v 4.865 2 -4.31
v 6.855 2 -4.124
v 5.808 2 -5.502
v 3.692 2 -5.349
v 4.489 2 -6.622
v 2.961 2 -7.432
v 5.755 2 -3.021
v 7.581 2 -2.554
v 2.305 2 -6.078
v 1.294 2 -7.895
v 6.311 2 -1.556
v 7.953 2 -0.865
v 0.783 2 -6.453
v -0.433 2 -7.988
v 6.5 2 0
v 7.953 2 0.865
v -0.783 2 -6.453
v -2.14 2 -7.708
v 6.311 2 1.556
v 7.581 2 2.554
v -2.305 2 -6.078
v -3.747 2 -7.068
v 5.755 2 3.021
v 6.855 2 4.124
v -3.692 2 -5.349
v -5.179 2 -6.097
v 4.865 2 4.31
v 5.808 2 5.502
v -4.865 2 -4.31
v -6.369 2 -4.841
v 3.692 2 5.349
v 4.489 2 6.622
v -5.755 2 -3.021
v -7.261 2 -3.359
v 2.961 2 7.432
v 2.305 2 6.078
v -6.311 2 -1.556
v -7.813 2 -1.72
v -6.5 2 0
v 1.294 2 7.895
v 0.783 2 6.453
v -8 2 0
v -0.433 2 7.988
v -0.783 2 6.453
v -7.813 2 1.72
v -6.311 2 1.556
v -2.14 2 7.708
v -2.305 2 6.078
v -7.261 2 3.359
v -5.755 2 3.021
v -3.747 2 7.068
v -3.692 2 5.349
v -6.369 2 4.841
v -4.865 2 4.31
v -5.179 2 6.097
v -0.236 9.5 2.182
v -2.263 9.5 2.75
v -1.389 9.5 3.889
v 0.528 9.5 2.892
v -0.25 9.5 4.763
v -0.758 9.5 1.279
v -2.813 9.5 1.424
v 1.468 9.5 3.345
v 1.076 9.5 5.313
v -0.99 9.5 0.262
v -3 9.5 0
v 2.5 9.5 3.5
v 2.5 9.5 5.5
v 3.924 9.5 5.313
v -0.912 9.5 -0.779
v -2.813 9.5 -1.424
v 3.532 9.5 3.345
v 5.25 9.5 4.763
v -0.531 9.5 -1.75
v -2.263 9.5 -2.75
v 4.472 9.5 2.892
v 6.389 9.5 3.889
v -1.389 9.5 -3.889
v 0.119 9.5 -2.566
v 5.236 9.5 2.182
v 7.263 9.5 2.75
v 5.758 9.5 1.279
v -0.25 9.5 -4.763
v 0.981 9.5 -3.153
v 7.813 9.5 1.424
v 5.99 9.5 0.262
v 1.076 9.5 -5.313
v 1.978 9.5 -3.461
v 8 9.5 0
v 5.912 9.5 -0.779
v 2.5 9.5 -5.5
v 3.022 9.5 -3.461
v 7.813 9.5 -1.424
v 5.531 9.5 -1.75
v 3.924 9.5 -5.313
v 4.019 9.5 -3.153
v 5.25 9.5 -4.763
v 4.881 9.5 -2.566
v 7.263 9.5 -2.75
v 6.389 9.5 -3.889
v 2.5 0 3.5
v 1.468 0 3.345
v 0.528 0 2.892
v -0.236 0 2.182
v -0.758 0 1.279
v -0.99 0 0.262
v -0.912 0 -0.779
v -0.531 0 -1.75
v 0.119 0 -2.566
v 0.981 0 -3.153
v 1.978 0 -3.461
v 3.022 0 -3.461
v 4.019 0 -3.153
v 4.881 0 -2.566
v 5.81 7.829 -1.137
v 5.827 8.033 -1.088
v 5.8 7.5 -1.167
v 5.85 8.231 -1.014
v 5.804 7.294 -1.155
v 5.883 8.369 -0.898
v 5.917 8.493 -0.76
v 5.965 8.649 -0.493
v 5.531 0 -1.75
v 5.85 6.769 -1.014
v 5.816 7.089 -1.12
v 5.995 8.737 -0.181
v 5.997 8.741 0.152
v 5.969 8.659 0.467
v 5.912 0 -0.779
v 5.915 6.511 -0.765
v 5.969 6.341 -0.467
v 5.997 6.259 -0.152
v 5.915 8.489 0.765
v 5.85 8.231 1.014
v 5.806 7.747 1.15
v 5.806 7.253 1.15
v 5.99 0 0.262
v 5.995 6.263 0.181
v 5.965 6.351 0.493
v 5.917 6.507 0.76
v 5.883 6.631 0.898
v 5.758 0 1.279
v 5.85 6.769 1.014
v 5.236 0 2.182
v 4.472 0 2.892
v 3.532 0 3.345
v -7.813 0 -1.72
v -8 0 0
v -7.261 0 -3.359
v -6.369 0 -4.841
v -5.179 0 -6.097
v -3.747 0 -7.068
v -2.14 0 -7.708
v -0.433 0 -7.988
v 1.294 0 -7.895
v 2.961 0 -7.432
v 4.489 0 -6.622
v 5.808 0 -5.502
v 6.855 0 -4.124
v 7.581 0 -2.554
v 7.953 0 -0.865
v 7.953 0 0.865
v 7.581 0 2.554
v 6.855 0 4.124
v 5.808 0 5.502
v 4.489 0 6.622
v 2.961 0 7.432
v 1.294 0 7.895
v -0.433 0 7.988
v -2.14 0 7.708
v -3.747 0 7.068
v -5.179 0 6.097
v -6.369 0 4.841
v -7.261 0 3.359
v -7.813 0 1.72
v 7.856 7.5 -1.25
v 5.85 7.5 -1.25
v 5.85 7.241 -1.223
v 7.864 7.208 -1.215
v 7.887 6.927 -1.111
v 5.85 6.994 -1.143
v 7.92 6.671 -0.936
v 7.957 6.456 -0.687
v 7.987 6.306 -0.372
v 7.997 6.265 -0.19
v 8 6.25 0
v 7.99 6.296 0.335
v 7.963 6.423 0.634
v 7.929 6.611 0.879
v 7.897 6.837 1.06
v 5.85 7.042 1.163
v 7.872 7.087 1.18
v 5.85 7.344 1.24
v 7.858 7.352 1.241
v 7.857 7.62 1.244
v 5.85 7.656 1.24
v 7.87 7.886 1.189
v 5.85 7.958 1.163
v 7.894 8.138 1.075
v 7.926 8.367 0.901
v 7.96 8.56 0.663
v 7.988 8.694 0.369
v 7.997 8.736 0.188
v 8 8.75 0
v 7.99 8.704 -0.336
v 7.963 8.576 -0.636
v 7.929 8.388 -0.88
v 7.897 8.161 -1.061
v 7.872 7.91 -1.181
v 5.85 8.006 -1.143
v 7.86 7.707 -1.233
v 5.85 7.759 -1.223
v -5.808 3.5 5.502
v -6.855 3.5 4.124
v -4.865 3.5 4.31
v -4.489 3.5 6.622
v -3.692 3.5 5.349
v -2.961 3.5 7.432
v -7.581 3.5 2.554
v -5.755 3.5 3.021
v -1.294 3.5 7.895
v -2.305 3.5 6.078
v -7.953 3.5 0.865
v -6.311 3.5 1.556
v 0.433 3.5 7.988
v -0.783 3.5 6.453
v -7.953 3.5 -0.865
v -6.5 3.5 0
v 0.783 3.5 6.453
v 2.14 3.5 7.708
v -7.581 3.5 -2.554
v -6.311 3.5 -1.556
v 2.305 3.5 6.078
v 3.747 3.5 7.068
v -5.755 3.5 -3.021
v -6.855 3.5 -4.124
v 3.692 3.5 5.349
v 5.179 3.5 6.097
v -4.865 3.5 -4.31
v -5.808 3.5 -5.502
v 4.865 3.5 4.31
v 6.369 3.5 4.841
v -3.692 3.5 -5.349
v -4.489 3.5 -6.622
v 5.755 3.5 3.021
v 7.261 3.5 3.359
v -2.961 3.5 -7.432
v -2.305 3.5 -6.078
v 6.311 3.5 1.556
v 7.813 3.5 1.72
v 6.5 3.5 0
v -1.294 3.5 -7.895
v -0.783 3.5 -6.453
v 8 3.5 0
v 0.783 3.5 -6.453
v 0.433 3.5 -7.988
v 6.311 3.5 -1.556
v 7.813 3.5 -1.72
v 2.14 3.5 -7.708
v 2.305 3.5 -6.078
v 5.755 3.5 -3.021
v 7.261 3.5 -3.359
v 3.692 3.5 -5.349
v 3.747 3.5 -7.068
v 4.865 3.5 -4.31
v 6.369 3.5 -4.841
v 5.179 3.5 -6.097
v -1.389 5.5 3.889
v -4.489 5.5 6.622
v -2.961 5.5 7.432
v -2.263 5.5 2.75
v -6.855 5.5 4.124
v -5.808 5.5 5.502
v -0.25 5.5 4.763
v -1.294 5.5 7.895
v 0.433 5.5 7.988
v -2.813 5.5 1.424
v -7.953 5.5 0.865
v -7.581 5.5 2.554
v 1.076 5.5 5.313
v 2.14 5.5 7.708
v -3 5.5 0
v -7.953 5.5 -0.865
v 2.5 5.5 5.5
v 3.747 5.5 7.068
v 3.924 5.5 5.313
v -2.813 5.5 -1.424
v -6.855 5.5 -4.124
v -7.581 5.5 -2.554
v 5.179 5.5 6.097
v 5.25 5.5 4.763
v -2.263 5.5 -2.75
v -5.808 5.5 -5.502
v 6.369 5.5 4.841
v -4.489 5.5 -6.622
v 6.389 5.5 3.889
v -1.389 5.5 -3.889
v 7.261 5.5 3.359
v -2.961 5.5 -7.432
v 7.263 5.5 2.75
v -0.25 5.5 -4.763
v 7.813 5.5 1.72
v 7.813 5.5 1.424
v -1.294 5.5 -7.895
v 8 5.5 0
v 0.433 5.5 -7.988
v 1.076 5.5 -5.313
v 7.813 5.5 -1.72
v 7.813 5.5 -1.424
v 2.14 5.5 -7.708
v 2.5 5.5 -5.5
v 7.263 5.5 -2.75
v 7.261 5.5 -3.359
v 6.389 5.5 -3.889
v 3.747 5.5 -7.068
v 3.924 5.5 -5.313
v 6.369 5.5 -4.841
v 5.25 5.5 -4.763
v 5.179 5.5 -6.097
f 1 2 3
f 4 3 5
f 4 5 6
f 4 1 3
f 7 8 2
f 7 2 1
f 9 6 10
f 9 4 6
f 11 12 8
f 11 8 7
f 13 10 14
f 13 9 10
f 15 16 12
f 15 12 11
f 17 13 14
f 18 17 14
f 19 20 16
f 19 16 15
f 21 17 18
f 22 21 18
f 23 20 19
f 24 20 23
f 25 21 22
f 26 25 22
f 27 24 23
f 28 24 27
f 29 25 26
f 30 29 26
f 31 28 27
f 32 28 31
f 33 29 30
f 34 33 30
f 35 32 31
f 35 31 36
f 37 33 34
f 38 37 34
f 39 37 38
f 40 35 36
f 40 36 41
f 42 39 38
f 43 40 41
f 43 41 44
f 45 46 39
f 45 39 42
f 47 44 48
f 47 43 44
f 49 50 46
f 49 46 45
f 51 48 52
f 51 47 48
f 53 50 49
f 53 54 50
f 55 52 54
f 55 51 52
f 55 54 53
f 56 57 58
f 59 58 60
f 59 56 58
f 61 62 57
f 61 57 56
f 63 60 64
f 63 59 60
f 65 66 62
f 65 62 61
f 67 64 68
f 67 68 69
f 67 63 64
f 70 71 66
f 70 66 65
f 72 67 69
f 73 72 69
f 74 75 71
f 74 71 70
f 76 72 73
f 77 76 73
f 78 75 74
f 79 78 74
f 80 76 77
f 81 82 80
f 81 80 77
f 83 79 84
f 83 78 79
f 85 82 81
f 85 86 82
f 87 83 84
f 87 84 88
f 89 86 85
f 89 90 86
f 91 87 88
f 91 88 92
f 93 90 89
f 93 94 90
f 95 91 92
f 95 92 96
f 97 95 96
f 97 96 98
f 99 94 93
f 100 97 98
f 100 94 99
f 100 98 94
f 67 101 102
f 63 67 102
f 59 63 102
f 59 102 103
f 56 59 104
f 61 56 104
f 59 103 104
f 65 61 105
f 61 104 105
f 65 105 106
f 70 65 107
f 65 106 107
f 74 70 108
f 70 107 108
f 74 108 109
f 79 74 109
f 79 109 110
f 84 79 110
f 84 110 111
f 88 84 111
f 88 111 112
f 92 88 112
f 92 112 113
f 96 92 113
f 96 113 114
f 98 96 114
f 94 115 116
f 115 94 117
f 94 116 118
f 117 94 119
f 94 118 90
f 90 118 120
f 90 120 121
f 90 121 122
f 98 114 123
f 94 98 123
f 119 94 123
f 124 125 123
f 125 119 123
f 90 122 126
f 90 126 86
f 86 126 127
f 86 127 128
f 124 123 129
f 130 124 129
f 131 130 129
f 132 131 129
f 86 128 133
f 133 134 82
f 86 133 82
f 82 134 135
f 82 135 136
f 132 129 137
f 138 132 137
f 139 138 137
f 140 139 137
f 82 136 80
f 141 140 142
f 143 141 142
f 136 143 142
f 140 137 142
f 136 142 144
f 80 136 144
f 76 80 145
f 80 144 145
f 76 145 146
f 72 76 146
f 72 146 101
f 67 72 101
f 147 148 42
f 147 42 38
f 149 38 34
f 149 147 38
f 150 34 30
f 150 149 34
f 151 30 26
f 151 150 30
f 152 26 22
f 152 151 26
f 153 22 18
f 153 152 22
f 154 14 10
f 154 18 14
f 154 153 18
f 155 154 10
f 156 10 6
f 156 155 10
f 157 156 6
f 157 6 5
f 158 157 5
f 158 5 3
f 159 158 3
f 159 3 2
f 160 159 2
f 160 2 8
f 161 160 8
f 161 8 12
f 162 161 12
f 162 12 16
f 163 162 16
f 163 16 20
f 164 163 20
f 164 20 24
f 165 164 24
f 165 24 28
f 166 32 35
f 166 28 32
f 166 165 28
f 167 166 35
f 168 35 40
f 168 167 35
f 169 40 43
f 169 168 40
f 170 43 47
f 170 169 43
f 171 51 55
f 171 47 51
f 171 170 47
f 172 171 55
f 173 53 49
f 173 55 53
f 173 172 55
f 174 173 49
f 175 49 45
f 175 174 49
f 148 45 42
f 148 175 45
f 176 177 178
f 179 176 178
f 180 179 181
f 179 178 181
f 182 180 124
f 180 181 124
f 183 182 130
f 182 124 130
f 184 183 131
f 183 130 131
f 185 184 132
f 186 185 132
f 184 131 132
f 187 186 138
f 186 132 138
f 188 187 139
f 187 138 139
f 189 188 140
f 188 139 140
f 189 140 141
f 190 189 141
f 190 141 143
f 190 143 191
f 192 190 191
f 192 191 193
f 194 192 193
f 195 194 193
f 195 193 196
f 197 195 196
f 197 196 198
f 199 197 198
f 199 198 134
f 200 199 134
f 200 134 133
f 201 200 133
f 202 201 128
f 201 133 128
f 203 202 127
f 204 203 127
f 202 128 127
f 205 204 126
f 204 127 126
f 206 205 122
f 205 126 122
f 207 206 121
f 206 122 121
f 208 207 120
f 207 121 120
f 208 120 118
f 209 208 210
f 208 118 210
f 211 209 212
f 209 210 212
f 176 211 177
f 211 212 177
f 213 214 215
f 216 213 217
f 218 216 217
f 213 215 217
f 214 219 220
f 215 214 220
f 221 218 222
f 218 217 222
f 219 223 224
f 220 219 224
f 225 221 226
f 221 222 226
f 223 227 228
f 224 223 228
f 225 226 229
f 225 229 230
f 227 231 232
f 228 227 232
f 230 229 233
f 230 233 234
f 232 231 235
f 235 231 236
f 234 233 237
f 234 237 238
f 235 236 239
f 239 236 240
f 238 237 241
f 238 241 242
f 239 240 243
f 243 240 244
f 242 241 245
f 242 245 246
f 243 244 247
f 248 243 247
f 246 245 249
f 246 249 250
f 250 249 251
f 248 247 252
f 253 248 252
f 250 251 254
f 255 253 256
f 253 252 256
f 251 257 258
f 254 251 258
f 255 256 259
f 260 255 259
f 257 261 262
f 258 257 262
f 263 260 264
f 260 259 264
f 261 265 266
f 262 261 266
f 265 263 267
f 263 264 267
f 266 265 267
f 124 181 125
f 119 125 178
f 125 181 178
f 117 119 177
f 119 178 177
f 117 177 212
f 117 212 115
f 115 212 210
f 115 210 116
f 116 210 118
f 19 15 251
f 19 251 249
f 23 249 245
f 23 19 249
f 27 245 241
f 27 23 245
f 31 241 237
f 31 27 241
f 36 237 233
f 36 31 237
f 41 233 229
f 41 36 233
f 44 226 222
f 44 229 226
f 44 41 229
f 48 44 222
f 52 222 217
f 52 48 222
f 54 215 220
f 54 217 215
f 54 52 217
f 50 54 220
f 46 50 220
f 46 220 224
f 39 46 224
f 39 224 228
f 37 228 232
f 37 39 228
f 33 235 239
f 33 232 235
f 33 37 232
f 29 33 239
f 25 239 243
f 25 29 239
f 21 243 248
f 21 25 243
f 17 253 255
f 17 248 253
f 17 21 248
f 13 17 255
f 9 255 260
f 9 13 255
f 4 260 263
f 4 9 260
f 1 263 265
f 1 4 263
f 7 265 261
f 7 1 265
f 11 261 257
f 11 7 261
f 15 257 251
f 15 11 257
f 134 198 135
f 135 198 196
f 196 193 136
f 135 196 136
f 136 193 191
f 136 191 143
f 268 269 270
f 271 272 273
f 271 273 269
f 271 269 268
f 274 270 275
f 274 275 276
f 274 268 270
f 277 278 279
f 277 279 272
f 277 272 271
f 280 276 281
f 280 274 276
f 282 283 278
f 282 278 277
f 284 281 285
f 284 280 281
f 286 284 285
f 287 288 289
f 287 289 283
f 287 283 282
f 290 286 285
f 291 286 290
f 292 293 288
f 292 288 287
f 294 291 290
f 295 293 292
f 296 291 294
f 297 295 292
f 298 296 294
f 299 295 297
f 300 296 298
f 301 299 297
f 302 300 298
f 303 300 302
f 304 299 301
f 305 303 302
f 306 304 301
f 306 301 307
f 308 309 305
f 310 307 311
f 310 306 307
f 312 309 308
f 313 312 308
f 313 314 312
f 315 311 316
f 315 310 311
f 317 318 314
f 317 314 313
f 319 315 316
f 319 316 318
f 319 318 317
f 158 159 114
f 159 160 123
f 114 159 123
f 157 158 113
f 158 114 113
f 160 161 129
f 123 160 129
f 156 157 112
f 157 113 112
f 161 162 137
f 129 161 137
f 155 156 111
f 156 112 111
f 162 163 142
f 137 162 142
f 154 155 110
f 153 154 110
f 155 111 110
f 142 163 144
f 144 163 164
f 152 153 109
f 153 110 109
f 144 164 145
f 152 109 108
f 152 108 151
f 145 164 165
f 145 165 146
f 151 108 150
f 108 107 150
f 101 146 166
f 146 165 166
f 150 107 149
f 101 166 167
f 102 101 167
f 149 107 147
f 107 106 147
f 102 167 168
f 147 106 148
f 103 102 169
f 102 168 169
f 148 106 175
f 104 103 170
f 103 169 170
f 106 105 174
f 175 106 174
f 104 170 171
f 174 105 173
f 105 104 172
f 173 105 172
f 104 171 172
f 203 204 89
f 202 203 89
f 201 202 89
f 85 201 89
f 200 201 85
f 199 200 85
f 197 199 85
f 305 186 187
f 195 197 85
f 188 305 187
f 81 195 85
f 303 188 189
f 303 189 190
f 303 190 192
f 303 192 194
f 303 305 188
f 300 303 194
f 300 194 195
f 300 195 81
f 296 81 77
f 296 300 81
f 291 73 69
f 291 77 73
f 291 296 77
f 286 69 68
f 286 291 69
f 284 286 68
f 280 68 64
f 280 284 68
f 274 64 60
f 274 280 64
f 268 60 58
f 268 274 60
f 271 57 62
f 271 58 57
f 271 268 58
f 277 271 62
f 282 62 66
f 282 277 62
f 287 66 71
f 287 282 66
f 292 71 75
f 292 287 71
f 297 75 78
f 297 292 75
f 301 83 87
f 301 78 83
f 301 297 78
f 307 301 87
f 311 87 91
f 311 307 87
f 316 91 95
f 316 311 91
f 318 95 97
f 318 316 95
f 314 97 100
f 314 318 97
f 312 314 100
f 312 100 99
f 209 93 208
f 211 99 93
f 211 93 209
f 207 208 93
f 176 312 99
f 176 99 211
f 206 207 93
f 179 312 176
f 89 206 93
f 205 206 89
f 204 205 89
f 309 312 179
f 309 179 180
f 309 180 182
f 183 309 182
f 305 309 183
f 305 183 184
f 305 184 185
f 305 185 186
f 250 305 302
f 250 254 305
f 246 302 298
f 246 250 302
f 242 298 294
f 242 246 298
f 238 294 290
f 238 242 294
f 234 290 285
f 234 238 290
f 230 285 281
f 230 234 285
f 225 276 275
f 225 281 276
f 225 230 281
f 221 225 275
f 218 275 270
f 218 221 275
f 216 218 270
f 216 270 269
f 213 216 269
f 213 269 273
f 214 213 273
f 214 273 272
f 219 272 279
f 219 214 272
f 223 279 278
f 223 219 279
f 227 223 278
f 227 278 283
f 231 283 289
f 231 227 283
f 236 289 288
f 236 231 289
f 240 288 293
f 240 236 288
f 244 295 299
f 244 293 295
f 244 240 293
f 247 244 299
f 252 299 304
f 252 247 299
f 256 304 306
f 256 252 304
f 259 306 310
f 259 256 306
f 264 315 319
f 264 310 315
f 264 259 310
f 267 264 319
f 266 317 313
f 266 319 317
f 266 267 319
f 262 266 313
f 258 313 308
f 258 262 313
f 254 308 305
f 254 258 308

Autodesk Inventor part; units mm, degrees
ref_plane "XZ Plane" through (0, 0, 0) normal (0, 1, 0) x (-1, 0, 0)
ref_plane "XY Plane" through (0, 0, 0) normal (0, 0, 1) x (1, 0, 0)
sketch "Sketch1" plane through (0, 0, 0) normal (0, 1, 0) x (-1, 0, 0)
  circle A0 centre (0, 0) radius 8
  dimension "d0" = 16
extrude "Extrusion1" add sketch "Sketch1" along normal blind 2
sketch "Sketch2" plane through (0, 2, 0) normal (0, 1, 0) x (1, 0, 0)
  circle A0 centre (0, 0) radius 6.5
  dimension "d3" = 13
extrude "Extrusion2" add sketch "Sketch2" along normal blind 1.5
sketch "Sketch3" plane through (0, 3.5, 0) normal (0, 1, 0) x (1, 0, 0)
  circle A0 centre (0, 0) radius 8
  dimension "d6" = 16
extrude "Extrusion3" add sketch "Sketch3" along normal blind 2
sketch "Sketch4" plane through (0, 5.5, 0) normal (0, 1, 0) x (1, 0, 0)
  circle A0 centre (2.5, 0) radius 5.5
  circle A1 centre (0, 0) radius 8 projected
  dimension "d9" = 11
extrude "Extrusion4" add sketch "Sketch4" along normal blind 4 contours A0
ref_plane "Work Plane1" through (8, 5.5, 0) normal (1, 0, 0) x (0, 1, 0)
sketch "Sketch5" plane through (8, 5.5, 0) normal (1, 0, 0) x (0, 1, 0)
  line L0 (4, -5.5) -> (4, 5.5) projected
  point P0 (-5.5, 0)
  point P1 (2, 0)
  dimension "d12" = 2
hole "Hole1" at (8, 7.5, 0) direction (-1, 0, 0) diameter 2.5 depth 2.15 tip angle 118
thread "Thread1" size "M2.5x0.45" class "6H" standard "ANSI Metric M Profile" length 5.5
sketch "Sketch6" plane through (2.5, 9.5, 0) normal (0, 1, 0) x (1, 0, 0)
  point P0 (-2.5, 0)
  point P1 (0, 0)
hole "Hole2" at (2.5, 9.5, 0) direction (0, -1, 0) diameter 7 end through all
properties material "Steel, Mild"
